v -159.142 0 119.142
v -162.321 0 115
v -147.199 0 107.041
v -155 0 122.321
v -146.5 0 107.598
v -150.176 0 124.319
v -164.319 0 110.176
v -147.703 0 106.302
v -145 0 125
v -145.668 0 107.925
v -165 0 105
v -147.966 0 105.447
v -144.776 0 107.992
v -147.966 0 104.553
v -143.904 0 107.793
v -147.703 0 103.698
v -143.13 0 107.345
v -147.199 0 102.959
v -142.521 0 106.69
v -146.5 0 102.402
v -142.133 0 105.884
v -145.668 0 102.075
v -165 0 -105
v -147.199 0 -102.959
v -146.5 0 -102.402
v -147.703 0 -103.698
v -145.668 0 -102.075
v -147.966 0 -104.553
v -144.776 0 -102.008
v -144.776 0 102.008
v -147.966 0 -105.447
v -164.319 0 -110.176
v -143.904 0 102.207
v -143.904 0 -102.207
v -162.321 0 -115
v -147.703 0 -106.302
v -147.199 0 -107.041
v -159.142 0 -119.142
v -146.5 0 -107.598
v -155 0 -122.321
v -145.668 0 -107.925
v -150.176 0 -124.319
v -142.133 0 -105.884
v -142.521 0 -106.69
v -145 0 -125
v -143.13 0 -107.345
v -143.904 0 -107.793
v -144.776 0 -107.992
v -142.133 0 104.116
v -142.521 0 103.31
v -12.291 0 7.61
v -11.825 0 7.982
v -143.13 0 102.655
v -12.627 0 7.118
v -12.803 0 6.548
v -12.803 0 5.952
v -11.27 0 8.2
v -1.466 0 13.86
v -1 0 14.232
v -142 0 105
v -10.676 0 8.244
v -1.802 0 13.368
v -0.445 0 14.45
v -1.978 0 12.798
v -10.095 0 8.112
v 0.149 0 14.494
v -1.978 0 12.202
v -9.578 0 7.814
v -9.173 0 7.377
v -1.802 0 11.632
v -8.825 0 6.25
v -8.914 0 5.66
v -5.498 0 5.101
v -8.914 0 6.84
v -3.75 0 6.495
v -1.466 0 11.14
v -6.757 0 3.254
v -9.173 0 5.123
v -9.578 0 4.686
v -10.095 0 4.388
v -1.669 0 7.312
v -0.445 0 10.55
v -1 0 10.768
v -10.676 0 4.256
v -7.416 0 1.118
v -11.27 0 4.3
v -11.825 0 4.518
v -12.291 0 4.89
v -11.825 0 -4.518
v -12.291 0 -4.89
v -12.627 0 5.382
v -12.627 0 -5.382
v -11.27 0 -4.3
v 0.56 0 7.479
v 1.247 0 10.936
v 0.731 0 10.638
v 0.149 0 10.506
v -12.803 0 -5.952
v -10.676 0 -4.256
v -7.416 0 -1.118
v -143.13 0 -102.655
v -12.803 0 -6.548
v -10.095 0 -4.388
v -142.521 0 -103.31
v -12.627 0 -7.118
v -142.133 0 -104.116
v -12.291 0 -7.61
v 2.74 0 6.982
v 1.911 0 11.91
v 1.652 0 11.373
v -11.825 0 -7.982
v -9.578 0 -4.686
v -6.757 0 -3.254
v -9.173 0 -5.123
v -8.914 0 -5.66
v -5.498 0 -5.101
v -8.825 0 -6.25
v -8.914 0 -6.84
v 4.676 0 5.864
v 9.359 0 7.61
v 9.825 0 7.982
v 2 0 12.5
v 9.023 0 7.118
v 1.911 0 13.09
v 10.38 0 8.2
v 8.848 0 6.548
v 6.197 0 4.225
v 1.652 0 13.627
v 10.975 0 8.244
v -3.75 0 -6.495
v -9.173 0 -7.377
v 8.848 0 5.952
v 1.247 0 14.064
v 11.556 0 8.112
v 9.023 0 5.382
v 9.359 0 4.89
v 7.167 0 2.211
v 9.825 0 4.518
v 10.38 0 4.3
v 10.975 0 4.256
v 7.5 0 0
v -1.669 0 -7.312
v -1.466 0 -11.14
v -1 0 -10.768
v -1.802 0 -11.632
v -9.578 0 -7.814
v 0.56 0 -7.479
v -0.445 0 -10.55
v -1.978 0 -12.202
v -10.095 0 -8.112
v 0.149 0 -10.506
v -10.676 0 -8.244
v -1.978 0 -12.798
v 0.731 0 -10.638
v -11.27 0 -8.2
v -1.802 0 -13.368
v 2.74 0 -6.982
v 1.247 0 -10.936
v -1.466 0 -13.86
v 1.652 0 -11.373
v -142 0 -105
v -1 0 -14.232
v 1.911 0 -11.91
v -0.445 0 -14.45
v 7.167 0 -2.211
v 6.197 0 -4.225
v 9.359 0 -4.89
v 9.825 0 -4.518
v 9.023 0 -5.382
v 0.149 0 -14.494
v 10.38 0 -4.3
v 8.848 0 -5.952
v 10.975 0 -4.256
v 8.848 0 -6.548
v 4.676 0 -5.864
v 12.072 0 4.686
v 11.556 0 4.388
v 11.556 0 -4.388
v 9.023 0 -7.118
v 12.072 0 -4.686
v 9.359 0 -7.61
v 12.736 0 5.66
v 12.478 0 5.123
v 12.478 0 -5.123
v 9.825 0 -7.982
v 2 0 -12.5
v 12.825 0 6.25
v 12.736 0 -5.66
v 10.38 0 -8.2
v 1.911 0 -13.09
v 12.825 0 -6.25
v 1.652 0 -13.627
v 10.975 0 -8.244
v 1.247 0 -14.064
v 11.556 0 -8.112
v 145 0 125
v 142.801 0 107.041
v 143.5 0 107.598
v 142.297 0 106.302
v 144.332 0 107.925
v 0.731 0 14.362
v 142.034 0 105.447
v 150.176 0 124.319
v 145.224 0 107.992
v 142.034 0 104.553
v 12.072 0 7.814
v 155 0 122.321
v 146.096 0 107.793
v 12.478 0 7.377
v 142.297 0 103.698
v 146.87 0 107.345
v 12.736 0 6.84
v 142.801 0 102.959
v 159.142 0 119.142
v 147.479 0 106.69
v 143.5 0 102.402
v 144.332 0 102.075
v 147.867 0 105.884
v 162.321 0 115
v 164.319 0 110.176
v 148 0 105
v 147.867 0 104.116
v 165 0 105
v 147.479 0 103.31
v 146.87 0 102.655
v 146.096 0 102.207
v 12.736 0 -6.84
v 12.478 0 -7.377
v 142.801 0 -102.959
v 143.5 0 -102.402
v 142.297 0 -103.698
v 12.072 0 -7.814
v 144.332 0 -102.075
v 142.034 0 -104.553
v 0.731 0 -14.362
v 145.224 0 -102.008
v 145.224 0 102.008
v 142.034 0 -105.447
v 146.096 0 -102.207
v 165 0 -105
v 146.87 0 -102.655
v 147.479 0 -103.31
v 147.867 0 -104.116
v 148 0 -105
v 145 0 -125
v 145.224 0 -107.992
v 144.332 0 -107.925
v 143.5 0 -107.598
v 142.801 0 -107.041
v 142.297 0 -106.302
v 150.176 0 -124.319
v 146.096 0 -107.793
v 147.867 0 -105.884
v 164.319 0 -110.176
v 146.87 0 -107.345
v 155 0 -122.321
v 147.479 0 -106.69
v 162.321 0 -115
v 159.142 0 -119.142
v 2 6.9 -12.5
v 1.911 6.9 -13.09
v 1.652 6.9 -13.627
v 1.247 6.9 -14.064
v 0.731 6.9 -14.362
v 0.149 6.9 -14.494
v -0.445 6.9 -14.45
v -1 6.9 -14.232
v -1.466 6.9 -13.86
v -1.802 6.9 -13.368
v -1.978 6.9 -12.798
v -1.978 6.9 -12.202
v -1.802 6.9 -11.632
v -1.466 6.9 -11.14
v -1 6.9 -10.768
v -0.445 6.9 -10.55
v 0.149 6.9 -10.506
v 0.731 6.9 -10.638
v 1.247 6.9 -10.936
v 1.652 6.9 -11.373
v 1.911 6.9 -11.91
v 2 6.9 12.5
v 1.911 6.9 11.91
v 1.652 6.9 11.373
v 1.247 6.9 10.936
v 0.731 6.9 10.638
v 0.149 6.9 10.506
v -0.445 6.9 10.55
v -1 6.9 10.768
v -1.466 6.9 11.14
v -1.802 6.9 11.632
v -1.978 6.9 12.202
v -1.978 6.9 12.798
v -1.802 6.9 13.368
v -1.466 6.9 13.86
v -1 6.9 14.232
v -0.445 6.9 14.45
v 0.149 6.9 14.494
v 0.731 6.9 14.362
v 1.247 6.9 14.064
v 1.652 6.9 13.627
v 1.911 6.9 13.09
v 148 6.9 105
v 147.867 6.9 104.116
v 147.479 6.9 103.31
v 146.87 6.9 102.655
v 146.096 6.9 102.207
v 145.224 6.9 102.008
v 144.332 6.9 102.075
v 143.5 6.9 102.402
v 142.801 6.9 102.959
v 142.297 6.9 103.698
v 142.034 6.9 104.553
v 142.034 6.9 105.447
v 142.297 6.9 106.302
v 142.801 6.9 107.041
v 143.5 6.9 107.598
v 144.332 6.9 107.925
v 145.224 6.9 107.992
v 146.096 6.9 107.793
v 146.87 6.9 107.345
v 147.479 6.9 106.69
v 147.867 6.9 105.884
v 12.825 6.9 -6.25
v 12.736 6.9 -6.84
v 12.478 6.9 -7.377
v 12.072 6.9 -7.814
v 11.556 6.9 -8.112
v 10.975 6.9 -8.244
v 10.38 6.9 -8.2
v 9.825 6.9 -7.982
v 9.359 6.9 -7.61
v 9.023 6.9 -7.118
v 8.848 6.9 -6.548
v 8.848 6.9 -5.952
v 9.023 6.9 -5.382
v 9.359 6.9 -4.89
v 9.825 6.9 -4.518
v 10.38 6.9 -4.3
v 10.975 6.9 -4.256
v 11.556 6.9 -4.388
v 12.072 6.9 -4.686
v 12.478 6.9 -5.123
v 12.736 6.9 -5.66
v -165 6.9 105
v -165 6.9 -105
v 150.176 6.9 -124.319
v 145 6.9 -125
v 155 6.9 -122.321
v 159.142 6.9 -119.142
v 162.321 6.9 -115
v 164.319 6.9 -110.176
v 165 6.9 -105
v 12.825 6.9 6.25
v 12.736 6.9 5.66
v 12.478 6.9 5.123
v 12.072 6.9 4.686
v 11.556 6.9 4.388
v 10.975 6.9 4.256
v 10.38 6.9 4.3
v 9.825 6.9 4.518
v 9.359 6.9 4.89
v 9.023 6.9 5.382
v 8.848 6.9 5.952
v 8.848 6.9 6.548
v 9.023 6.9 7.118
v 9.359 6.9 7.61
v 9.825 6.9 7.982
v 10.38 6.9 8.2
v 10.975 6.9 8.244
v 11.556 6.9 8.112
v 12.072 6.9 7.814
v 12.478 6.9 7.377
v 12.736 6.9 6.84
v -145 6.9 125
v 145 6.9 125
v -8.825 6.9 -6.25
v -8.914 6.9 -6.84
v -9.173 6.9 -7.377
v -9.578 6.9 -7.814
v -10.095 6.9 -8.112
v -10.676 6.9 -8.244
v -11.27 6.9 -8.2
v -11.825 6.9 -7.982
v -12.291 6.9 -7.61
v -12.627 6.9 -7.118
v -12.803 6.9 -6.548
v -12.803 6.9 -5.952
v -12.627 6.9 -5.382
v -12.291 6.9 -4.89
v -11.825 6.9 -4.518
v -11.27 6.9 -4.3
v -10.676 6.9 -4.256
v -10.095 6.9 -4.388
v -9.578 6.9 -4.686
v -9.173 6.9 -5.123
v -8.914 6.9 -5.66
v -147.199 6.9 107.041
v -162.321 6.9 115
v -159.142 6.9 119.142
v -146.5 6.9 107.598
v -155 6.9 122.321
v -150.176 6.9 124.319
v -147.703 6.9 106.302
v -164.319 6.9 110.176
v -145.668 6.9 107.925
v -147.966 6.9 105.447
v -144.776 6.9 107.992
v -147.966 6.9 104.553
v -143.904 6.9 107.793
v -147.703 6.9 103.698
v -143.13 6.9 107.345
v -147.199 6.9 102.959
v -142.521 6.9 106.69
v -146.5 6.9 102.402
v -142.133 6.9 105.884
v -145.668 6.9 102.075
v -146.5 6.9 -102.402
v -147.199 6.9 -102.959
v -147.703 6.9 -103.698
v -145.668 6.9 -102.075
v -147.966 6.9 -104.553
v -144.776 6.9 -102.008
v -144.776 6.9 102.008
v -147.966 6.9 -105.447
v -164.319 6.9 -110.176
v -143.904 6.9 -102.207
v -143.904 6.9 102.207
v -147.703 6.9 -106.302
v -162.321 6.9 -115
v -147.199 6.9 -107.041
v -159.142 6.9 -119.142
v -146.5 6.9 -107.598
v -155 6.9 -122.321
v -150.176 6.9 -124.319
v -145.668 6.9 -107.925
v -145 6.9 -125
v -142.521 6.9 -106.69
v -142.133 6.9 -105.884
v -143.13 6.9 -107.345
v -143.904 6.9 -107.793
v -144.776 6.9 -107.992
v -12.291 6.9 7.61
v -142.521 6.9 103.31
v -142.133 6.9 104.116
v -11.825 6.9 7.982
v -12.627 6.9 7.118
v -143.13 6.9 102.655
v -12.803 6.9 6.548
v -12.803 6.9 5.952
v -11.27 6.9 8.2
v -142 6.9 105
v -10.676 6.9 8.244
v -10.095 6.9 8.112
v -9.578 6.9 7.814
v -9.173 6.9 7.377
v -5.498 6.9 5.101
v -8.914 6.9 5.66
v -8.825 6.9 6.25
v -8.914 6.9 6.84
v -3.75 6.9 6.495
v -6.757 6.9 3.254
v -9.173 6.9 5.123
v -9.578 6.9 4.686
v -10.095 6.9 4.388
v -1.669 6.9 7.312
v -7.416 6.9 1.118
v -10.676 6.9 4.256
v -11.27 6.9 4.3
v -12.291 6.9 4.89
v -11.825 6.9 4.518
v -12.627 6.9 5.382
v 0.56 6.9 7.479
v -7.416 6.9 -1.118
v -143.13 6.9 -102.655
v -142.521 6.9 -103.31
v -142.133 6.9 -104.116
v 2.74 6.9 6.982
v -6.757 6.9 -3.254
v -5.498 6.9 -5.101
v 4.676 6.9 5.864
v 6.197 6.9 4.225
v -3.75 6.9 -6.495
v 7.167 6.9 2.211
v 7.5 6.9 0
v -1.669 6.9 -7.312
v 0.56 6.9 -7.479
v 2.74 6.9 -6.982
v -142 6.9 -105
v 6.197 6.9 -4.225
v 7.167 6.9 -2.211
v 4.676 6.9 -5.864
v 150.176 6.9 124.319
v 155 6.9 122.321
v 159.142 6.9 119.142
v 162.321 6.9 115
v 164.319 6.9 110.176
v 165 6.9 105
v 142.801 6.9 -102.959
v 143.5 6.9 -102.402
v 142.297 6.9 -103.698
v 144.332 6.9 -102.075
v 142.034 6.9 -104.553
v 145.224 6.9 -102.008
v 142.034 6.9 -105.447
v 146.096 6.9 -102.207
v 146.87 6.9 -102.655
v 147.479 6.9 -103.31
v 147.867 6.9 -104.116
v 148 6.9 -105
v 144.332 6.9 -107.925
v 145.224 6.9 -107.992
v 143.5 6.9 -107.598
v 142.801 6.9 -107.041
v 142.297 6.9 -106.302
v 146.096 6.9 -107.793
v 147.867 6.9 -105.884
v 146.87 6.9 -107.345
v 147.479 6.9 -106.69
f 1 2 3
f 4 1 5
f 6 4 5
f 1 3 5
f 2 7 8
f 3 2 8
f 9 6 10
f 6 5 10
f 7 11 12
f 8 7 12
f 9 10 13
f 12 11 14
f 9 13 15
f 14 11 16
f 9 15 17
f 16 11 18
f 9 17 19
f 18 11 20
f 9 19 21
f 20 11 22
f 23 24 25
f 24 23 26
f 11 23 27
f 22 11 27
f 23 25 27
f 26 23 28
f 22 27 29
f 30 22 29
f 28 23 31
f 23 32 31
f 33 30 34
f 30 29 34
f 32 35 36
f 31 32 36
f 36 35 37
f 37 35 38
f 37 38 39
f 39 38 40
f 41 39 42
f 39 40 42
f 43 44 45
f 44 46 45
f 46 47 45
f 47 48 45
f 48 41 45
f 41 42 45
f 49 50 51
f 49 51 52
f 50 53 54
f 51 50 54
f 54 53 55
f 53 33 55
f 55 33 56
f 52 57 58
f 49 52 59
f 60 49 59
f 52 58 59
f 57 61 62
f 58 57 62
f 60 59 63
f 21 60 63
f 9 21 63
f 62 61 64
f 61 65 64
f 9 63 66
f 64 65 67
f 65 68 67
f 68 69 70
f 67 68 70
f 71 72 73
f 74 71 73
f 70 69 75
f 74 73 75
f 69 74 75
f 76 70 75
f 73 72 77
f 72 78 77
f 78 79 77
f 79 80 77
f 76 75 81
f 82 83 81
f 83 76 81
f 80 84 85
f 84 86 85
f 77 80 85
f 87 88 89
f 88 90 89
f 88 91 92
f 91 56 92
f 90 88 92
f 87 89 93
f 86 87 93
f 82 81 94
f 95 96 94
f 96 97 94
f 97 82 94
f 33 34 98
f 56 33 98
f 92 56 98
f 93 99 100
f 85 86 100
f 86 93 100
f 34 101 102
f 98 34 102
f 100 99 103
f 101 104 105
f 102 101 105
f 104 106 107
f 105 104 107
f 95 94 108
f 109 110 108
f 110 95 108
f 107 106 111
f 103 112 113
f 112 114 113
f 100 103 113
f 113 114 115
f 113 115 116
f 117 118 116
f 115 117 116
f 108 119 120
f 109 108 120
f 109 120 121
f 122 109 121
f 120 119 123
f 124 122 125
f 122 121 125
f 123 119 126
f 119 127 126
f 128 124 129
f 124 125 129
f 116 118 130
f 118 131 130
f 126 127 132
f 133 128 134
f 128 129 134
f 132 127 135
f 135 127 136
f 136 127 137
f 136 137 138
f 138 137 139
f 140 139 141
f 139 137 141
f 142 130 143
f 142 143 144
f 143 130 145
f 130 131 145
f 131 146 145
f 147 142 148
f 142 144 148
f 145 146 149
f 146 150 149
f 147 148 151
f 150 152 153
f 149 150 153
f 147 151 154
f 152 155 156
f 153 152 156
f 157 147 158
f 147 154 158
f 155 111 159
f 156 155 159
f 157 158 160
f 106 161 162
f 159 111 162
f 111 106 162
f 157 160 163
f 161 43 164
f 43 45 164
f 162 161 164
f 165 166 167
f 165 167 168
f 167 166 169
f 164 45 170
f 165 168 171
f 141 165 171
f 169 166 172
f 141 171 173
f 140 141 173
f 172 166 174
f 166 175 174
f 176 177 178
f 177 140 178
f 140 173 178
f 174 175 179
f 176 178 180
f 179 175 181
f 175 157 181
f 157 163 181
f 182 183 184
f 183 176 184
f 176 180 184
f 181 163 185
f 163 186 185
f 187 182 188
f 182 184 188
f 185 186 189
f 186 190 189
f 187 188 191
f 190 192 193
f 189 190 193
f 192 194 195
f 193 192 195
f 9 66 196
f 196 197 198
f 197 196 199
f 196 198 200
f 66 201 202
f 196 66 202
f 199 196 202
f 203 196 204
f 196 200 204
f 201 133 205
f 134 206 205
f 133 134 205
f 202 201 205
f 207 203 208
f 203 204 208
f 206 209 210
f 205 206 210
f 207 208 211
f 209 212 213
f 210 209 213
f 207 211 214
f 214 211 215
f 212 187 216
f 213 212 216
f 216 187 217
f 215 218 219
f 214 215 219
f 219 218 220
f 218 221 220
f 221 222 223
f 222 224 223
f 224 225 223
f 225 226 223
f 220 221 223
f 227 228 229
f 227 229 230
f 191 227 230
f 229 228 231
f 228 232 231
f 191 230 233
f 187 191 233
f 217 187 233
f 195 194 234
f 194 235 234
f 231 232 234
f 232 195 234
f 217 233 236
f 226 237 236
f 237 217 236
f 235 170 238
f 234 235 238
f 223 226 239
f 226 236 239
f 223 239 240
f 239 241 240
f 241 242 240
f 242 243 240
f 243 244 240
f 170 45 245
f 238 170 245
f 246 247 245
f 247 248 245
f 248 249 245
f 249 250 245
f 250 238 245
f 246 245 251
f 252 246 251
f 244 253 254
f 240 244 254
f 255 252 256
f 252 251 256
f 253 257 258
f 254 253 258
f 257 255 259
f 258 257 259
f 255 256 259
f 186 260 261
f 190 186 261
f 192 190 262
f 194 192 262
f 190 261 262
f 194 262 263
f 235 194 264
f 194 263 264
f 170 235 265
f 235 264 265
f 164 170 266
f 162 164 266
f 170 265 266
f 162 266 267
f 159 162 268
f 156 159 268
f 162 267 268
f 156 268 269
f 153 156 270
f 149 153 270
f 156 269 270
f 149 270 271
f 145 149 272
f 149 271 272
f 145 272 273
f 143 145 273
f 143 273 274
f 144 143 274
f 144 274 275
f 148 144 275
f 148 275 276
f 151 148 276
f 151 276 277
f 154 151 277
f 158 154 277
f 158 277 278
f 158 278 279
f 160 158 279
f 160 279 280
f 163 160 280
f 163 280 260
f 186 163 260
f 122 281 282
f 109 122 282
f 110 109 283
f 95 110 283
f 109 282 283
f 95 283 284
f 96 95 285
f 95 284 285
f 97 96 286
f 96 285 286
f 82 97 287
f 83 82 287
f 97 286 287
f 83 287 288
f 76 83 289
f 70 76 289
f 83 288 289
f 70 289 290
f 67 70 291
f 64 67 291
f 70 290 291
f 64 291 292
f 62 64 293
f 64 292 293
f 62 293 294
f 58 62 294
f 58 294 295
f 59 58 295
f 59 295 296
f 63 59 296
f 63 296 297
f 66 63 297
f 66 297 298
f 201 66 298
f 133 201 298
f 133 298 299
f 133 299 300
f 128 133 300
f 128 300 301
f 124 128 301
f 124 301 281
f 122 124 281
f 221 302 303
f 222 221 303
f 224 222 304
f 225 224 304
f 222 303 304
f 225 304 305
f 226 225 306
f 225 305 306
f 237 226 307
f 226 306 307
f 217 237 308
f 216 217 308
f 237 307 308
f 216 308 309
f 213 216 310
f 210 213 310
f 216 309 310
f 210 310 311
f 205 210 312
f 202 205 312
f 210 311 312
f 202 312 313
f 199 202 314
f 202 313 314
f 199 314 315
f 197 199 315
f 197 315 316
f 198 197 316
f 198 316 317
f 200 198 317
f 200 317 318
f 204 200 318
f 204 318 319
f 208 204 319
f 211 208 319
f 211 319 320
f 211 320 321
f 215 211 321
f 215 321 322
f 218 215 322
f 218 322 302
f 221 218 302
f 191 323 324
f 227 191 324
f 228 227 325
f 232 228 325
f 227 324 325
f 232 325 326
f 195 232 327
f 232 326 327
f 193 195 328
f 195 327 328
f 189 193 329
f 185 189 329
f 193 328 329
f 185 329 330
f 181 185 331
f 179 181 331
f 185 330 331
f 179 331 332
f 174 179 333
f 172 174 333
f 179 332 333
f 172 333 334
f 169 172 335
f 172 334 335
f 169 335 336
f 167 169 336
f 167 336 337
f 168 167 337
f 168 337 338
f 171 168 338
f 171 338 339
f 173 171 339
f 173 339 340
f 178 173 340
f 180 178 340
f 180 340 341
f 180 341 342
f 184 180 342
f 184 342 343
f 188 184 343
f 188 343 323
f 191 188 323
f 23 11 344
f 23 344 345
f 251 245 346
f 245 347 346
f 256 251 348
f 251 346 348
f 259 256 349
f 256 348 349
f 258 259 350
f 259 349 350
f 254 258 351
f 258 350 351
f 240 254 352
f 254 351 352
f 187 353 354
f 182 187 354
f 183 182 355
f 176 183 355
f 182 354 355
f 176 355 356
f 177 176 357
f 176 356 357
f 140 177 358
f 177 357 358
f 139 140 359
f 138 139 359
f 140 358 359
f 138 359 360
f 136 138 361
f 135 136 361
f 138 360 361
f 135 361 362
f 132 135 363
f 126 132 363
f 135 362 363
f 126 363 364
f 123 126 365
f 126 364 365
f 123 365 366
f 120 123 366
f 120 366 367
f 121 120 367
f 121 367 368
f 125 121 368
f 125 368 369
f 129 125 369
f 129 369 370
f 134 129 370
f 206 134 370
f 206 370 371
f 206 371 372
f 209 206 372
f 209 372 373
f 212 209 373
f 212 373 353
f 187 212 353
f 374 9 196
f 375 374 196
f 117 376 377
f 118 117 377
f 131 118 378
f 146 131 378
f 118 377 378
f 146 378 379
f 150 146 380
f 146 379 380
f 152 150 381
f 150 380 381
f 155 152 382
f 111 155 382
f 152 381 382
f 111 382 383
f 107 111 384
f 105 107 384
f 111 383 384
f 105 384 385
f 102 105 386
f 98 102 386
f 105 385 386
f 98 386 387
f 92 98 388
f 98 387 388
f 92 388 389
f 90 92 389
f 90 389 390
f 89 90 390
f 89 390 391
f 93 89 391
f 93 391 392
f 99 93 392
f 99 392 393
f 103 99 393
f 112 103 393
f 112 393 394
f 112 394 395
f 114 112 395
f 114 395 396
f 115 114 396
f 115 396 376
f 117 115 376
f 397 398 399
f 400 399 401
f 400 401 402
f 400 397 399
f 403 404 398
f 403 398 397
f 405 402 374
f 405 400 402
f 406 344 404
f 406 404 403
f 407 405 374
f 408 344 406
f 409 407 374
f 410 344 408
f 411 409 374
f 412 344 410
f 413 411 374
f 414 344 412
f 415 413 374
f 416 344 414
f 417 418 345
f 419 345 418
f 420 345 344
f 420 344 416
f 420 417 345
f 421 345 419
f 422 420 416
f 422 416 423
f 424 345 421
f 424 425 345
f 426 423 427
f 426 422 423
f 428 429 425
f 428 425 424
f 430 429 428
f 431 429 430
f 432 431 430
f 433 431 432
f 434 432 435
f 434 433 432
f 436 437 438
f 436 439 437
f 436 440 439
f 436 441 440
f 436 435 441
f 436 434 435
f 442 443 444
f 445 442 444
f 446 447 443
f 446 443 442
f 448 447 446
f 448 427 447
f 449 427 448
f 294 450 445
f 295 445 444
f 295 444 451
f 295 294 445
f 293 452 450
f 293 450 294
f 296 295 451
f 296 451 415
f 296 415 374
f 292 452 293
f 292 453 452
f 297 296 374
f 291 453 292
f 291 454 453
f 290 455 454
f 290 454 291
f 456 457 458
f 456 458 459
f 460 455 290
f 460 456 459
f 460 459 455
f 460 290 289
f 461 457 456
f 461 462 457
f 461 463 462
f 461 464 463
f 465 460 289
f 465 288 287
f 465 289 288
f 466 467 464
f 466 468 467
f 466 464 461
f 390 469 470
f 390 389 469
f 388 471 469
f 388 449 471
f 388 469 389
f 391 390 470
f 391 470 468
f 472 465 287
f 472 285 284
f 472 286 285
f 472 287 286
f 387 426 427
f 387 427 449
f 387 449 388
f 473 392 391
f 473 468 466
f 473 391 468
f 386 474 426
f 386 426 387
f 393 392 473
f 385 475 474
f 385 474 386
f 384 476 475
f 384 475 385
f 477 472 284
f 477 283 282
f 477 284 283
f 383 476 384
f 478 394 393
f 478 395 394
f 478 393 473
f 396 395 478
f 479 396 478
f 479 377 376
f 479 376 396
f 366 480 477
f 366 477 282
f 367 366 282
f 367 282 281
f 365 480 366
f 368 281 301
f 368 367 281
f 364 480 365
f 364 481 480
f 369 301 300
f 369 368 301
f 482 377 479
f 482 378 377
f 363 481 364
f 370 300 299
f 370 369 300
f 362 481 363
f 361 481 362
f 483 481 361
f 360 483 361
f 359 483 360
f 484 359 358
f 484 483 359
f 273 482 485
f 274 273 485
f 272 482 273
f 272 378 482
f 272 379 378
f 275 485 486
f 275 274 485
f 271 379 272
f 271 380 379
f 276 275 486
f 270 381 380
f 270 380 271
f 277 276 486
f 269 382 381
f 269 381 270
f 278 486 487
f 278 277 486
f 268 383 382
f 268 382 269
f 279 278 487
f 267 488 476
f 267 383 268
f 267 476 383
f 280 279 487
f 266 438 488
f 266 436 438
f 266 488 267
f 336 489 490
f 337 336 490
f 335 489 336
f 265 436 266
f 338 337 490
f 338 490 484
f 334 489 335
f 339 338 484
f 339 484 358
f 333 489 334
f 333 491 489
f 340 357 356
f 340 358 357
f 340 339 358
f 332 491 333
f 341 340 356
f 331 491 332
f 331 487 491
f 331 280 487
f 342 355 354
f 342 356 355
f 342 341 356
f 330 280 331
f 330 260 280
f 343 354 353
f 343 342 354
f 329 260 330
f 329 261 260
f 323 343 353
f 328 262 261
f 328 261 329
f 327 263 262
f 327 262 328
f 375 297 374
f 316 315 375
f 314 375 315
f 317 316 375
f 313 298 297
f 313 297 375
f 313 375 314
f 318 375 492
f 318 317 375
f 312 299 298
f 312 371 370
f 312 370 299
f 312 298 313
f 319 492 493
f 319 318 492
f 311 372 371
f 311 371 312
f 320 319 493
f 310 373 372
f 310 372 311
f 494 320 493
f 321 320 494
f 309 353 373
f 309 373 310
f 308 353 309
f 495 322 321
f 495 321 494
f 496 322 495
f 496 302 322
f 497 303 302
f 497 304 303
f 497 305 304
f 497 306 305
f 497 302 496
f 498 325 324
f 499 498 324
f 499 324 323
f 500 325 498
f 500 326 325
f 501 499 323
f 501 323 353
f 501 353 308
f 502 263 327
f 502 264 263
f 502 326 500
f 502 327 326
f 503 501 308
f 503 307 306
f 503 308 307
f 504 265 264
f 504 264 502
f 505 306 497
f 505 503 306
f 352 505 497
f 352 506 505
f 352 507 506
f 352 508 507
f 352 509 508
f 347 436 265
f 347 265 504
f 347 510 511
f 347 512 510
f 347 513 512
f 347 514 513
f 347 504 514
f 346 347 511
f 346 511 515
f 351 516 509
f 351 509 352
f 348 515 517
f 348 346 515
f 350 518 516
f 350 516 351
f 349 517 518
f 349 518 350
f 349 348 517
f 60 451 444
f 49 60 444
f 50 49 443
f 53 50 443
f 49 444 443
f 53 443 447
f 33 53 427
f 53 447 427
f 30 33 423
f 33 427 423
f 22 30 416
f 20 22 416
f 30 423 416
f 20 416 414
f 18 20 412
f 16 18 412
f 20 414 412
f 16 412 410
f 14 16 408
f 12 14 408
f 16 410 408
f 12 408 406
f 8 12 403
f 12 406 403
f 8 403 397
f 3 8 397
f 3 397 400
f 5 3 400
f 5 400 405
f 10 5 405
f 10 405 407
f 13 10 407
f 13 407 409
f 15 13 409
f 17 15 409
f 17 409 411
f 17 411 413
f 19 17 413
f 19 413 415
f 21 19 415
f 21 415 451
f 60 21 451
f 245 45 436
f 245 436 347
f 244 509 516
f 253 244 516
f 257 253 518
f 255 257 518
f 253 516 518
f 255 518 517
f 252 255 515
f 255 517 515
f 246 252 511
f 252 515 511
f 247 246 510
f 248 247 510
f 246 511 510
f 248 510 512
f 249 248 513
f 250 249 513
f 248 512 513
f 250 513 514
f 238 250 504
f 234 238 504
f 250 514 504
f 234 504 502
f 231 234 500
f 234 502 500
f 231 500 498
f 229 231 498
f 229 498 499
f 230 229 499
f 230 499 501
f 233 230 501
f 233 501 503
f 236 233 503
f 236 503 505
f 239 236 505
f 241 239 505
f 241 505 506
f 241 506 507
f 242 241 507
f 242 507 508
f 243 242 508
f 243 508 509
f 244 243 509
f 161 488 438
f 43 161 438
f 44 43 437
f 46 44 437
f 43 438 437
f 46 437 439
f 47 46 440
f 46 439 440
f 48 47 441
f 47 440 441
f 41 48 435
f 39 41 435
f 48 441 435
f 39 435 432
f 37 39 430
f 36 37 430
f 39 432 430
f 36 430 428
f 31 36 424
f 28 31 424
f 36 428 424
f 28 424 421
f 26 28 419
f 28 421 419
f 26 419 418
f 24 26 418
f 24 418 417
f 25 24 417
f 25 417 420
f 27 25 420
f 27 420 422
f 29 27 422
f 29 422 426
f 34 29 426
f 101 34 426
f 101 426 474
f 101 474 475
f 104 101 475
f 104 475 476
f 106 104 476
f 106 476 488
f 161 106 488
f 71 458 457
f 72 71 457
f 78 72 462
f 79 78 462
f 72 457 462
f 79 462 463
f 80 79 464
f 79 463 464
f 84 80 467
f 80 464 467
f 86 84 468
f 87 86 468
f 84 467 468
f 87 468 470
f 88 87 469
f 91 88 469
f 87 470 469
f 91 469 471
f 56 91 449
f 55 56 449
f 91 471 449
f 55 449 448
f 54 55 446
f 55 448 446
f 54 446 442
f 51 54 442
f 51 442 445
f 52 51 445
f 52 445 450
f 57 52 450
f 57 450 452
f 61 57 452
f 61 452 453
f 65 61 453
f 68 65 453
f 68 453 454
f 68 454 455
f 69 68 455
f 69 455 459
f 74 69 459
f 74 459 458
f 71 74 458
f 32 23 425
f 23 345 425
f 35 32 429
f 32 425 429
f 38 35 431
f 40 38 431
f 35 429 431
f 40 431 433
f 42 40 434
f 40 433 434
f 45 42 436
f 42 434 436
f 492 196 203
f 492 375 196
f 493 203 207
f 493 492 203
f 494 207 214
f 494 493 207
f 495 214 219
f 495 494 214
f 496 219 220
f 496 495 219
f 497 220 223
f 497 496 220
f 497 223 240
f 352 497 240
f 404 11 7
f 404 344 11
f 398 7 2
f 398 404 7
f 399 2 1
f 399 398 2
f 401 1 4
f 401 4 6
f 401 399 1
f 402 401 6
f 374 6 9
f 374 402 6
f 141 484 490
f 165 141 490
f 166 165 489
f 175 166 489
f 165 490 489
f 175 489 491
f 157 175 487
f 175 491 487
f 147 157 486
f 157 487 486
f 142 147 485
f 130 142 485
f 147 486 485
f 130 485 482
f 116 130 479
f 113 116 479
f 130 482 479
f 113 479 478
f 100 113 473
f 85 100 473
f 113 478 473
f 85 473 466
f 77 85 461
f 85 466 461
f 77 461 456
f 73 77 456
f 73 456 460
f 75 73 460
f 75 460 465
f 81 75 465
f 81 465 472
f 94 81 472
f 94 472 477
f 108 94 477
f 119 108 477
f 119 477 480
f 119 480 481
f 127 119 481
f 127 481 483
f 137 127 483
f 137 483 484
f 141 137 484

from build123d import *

# Parameters (mm, degrees)
SKETCH1_W           = 330
SKETCH1_H           = 250
BOSS_EXTRUDE1_DEPTH = 6.9
SKETCH2_R           = 3
CUT_EXTRUDE1_DEPTH  = 7.9
SKETCH3_R           = 2
SKETCH3_R_2         = 7.5
CUT_EXTRUDE2_DEPTH  = 7.9
FILLET1_R           = 20


with BuildPart() as part:
    # Sketch1 → Boss-Extrude1 (new body)
    with BuildSketch(Plane(origin=(0, 0, 0), x_dir=(1, 0, 0), z_dir=(0, 1, 0))):
        Rectangle(SKETCH1_W, SKETCH1_H)
    extrude(amount=BOSS_EXTRUDE1_DEPTH)

    # Sketch2 → Cut-Extrude1 (cut, through all)
    with BuildSketch(Plane(origin=(0, 6.9, 0), x_dir=(1, 0, 0), z_dir=(0, 1, 0))):
        with Locations((-145, 105)):
            Circle(SKETCH2_R)
        with Locations((145, 105)):
            Circle(SKETCH2_R)
        with Locations((145, -105)):
            Circle(SKETCH2_R)
        with Locations((-145, -105)):
            Circle(SKETCH2_R)
    extrude(amount=-CUT_EXTRUDE1_DEPTH, mode=Mode.SUBTRACT)

    # Sketch3 → Cut-Extrude2 (cut, through all)
    with BuildSketch(Plane(origin=(0, 6.9, 0), x_dir=(1, 0, 0), z_dir=(0, 1, 0))):
        with Locations((0, 12.5)):
            Circle(SKETCH3_R)
        with Locations((10.825317547, 6.25)):
            Circle(SKETCH3_R)
        with Locations((10.825317547, -6.25)):
            Circle(SKETCH3_R)
        with Locations((0, -12.5)):
            Circle(SKETCH3_R)
        with Locations((-10.825317547, -6.25)):
            Circle(SKETCH3_R)
        with Locations((-10.825317547, 6.25)):
            Circle(SKETCH3_R)
        Circle(SKETCH3_R_2)
    extrude(amount=-CUT_EXTRUDE2_DEPTH, mode=Mode.SUBTRACT)

    # Fillet1
    fillet1_edges = [part.edges().sort_by_distance(p)[0] for p in [
        (-165, 3.45, -125),
        (165, 3.45, -125),
        (165, 3.45, 125),
        (-165, 3.45, 125),
    ]]
    fillet(fillet1_edges, radius=FILLET1_R)


solid = part.part
